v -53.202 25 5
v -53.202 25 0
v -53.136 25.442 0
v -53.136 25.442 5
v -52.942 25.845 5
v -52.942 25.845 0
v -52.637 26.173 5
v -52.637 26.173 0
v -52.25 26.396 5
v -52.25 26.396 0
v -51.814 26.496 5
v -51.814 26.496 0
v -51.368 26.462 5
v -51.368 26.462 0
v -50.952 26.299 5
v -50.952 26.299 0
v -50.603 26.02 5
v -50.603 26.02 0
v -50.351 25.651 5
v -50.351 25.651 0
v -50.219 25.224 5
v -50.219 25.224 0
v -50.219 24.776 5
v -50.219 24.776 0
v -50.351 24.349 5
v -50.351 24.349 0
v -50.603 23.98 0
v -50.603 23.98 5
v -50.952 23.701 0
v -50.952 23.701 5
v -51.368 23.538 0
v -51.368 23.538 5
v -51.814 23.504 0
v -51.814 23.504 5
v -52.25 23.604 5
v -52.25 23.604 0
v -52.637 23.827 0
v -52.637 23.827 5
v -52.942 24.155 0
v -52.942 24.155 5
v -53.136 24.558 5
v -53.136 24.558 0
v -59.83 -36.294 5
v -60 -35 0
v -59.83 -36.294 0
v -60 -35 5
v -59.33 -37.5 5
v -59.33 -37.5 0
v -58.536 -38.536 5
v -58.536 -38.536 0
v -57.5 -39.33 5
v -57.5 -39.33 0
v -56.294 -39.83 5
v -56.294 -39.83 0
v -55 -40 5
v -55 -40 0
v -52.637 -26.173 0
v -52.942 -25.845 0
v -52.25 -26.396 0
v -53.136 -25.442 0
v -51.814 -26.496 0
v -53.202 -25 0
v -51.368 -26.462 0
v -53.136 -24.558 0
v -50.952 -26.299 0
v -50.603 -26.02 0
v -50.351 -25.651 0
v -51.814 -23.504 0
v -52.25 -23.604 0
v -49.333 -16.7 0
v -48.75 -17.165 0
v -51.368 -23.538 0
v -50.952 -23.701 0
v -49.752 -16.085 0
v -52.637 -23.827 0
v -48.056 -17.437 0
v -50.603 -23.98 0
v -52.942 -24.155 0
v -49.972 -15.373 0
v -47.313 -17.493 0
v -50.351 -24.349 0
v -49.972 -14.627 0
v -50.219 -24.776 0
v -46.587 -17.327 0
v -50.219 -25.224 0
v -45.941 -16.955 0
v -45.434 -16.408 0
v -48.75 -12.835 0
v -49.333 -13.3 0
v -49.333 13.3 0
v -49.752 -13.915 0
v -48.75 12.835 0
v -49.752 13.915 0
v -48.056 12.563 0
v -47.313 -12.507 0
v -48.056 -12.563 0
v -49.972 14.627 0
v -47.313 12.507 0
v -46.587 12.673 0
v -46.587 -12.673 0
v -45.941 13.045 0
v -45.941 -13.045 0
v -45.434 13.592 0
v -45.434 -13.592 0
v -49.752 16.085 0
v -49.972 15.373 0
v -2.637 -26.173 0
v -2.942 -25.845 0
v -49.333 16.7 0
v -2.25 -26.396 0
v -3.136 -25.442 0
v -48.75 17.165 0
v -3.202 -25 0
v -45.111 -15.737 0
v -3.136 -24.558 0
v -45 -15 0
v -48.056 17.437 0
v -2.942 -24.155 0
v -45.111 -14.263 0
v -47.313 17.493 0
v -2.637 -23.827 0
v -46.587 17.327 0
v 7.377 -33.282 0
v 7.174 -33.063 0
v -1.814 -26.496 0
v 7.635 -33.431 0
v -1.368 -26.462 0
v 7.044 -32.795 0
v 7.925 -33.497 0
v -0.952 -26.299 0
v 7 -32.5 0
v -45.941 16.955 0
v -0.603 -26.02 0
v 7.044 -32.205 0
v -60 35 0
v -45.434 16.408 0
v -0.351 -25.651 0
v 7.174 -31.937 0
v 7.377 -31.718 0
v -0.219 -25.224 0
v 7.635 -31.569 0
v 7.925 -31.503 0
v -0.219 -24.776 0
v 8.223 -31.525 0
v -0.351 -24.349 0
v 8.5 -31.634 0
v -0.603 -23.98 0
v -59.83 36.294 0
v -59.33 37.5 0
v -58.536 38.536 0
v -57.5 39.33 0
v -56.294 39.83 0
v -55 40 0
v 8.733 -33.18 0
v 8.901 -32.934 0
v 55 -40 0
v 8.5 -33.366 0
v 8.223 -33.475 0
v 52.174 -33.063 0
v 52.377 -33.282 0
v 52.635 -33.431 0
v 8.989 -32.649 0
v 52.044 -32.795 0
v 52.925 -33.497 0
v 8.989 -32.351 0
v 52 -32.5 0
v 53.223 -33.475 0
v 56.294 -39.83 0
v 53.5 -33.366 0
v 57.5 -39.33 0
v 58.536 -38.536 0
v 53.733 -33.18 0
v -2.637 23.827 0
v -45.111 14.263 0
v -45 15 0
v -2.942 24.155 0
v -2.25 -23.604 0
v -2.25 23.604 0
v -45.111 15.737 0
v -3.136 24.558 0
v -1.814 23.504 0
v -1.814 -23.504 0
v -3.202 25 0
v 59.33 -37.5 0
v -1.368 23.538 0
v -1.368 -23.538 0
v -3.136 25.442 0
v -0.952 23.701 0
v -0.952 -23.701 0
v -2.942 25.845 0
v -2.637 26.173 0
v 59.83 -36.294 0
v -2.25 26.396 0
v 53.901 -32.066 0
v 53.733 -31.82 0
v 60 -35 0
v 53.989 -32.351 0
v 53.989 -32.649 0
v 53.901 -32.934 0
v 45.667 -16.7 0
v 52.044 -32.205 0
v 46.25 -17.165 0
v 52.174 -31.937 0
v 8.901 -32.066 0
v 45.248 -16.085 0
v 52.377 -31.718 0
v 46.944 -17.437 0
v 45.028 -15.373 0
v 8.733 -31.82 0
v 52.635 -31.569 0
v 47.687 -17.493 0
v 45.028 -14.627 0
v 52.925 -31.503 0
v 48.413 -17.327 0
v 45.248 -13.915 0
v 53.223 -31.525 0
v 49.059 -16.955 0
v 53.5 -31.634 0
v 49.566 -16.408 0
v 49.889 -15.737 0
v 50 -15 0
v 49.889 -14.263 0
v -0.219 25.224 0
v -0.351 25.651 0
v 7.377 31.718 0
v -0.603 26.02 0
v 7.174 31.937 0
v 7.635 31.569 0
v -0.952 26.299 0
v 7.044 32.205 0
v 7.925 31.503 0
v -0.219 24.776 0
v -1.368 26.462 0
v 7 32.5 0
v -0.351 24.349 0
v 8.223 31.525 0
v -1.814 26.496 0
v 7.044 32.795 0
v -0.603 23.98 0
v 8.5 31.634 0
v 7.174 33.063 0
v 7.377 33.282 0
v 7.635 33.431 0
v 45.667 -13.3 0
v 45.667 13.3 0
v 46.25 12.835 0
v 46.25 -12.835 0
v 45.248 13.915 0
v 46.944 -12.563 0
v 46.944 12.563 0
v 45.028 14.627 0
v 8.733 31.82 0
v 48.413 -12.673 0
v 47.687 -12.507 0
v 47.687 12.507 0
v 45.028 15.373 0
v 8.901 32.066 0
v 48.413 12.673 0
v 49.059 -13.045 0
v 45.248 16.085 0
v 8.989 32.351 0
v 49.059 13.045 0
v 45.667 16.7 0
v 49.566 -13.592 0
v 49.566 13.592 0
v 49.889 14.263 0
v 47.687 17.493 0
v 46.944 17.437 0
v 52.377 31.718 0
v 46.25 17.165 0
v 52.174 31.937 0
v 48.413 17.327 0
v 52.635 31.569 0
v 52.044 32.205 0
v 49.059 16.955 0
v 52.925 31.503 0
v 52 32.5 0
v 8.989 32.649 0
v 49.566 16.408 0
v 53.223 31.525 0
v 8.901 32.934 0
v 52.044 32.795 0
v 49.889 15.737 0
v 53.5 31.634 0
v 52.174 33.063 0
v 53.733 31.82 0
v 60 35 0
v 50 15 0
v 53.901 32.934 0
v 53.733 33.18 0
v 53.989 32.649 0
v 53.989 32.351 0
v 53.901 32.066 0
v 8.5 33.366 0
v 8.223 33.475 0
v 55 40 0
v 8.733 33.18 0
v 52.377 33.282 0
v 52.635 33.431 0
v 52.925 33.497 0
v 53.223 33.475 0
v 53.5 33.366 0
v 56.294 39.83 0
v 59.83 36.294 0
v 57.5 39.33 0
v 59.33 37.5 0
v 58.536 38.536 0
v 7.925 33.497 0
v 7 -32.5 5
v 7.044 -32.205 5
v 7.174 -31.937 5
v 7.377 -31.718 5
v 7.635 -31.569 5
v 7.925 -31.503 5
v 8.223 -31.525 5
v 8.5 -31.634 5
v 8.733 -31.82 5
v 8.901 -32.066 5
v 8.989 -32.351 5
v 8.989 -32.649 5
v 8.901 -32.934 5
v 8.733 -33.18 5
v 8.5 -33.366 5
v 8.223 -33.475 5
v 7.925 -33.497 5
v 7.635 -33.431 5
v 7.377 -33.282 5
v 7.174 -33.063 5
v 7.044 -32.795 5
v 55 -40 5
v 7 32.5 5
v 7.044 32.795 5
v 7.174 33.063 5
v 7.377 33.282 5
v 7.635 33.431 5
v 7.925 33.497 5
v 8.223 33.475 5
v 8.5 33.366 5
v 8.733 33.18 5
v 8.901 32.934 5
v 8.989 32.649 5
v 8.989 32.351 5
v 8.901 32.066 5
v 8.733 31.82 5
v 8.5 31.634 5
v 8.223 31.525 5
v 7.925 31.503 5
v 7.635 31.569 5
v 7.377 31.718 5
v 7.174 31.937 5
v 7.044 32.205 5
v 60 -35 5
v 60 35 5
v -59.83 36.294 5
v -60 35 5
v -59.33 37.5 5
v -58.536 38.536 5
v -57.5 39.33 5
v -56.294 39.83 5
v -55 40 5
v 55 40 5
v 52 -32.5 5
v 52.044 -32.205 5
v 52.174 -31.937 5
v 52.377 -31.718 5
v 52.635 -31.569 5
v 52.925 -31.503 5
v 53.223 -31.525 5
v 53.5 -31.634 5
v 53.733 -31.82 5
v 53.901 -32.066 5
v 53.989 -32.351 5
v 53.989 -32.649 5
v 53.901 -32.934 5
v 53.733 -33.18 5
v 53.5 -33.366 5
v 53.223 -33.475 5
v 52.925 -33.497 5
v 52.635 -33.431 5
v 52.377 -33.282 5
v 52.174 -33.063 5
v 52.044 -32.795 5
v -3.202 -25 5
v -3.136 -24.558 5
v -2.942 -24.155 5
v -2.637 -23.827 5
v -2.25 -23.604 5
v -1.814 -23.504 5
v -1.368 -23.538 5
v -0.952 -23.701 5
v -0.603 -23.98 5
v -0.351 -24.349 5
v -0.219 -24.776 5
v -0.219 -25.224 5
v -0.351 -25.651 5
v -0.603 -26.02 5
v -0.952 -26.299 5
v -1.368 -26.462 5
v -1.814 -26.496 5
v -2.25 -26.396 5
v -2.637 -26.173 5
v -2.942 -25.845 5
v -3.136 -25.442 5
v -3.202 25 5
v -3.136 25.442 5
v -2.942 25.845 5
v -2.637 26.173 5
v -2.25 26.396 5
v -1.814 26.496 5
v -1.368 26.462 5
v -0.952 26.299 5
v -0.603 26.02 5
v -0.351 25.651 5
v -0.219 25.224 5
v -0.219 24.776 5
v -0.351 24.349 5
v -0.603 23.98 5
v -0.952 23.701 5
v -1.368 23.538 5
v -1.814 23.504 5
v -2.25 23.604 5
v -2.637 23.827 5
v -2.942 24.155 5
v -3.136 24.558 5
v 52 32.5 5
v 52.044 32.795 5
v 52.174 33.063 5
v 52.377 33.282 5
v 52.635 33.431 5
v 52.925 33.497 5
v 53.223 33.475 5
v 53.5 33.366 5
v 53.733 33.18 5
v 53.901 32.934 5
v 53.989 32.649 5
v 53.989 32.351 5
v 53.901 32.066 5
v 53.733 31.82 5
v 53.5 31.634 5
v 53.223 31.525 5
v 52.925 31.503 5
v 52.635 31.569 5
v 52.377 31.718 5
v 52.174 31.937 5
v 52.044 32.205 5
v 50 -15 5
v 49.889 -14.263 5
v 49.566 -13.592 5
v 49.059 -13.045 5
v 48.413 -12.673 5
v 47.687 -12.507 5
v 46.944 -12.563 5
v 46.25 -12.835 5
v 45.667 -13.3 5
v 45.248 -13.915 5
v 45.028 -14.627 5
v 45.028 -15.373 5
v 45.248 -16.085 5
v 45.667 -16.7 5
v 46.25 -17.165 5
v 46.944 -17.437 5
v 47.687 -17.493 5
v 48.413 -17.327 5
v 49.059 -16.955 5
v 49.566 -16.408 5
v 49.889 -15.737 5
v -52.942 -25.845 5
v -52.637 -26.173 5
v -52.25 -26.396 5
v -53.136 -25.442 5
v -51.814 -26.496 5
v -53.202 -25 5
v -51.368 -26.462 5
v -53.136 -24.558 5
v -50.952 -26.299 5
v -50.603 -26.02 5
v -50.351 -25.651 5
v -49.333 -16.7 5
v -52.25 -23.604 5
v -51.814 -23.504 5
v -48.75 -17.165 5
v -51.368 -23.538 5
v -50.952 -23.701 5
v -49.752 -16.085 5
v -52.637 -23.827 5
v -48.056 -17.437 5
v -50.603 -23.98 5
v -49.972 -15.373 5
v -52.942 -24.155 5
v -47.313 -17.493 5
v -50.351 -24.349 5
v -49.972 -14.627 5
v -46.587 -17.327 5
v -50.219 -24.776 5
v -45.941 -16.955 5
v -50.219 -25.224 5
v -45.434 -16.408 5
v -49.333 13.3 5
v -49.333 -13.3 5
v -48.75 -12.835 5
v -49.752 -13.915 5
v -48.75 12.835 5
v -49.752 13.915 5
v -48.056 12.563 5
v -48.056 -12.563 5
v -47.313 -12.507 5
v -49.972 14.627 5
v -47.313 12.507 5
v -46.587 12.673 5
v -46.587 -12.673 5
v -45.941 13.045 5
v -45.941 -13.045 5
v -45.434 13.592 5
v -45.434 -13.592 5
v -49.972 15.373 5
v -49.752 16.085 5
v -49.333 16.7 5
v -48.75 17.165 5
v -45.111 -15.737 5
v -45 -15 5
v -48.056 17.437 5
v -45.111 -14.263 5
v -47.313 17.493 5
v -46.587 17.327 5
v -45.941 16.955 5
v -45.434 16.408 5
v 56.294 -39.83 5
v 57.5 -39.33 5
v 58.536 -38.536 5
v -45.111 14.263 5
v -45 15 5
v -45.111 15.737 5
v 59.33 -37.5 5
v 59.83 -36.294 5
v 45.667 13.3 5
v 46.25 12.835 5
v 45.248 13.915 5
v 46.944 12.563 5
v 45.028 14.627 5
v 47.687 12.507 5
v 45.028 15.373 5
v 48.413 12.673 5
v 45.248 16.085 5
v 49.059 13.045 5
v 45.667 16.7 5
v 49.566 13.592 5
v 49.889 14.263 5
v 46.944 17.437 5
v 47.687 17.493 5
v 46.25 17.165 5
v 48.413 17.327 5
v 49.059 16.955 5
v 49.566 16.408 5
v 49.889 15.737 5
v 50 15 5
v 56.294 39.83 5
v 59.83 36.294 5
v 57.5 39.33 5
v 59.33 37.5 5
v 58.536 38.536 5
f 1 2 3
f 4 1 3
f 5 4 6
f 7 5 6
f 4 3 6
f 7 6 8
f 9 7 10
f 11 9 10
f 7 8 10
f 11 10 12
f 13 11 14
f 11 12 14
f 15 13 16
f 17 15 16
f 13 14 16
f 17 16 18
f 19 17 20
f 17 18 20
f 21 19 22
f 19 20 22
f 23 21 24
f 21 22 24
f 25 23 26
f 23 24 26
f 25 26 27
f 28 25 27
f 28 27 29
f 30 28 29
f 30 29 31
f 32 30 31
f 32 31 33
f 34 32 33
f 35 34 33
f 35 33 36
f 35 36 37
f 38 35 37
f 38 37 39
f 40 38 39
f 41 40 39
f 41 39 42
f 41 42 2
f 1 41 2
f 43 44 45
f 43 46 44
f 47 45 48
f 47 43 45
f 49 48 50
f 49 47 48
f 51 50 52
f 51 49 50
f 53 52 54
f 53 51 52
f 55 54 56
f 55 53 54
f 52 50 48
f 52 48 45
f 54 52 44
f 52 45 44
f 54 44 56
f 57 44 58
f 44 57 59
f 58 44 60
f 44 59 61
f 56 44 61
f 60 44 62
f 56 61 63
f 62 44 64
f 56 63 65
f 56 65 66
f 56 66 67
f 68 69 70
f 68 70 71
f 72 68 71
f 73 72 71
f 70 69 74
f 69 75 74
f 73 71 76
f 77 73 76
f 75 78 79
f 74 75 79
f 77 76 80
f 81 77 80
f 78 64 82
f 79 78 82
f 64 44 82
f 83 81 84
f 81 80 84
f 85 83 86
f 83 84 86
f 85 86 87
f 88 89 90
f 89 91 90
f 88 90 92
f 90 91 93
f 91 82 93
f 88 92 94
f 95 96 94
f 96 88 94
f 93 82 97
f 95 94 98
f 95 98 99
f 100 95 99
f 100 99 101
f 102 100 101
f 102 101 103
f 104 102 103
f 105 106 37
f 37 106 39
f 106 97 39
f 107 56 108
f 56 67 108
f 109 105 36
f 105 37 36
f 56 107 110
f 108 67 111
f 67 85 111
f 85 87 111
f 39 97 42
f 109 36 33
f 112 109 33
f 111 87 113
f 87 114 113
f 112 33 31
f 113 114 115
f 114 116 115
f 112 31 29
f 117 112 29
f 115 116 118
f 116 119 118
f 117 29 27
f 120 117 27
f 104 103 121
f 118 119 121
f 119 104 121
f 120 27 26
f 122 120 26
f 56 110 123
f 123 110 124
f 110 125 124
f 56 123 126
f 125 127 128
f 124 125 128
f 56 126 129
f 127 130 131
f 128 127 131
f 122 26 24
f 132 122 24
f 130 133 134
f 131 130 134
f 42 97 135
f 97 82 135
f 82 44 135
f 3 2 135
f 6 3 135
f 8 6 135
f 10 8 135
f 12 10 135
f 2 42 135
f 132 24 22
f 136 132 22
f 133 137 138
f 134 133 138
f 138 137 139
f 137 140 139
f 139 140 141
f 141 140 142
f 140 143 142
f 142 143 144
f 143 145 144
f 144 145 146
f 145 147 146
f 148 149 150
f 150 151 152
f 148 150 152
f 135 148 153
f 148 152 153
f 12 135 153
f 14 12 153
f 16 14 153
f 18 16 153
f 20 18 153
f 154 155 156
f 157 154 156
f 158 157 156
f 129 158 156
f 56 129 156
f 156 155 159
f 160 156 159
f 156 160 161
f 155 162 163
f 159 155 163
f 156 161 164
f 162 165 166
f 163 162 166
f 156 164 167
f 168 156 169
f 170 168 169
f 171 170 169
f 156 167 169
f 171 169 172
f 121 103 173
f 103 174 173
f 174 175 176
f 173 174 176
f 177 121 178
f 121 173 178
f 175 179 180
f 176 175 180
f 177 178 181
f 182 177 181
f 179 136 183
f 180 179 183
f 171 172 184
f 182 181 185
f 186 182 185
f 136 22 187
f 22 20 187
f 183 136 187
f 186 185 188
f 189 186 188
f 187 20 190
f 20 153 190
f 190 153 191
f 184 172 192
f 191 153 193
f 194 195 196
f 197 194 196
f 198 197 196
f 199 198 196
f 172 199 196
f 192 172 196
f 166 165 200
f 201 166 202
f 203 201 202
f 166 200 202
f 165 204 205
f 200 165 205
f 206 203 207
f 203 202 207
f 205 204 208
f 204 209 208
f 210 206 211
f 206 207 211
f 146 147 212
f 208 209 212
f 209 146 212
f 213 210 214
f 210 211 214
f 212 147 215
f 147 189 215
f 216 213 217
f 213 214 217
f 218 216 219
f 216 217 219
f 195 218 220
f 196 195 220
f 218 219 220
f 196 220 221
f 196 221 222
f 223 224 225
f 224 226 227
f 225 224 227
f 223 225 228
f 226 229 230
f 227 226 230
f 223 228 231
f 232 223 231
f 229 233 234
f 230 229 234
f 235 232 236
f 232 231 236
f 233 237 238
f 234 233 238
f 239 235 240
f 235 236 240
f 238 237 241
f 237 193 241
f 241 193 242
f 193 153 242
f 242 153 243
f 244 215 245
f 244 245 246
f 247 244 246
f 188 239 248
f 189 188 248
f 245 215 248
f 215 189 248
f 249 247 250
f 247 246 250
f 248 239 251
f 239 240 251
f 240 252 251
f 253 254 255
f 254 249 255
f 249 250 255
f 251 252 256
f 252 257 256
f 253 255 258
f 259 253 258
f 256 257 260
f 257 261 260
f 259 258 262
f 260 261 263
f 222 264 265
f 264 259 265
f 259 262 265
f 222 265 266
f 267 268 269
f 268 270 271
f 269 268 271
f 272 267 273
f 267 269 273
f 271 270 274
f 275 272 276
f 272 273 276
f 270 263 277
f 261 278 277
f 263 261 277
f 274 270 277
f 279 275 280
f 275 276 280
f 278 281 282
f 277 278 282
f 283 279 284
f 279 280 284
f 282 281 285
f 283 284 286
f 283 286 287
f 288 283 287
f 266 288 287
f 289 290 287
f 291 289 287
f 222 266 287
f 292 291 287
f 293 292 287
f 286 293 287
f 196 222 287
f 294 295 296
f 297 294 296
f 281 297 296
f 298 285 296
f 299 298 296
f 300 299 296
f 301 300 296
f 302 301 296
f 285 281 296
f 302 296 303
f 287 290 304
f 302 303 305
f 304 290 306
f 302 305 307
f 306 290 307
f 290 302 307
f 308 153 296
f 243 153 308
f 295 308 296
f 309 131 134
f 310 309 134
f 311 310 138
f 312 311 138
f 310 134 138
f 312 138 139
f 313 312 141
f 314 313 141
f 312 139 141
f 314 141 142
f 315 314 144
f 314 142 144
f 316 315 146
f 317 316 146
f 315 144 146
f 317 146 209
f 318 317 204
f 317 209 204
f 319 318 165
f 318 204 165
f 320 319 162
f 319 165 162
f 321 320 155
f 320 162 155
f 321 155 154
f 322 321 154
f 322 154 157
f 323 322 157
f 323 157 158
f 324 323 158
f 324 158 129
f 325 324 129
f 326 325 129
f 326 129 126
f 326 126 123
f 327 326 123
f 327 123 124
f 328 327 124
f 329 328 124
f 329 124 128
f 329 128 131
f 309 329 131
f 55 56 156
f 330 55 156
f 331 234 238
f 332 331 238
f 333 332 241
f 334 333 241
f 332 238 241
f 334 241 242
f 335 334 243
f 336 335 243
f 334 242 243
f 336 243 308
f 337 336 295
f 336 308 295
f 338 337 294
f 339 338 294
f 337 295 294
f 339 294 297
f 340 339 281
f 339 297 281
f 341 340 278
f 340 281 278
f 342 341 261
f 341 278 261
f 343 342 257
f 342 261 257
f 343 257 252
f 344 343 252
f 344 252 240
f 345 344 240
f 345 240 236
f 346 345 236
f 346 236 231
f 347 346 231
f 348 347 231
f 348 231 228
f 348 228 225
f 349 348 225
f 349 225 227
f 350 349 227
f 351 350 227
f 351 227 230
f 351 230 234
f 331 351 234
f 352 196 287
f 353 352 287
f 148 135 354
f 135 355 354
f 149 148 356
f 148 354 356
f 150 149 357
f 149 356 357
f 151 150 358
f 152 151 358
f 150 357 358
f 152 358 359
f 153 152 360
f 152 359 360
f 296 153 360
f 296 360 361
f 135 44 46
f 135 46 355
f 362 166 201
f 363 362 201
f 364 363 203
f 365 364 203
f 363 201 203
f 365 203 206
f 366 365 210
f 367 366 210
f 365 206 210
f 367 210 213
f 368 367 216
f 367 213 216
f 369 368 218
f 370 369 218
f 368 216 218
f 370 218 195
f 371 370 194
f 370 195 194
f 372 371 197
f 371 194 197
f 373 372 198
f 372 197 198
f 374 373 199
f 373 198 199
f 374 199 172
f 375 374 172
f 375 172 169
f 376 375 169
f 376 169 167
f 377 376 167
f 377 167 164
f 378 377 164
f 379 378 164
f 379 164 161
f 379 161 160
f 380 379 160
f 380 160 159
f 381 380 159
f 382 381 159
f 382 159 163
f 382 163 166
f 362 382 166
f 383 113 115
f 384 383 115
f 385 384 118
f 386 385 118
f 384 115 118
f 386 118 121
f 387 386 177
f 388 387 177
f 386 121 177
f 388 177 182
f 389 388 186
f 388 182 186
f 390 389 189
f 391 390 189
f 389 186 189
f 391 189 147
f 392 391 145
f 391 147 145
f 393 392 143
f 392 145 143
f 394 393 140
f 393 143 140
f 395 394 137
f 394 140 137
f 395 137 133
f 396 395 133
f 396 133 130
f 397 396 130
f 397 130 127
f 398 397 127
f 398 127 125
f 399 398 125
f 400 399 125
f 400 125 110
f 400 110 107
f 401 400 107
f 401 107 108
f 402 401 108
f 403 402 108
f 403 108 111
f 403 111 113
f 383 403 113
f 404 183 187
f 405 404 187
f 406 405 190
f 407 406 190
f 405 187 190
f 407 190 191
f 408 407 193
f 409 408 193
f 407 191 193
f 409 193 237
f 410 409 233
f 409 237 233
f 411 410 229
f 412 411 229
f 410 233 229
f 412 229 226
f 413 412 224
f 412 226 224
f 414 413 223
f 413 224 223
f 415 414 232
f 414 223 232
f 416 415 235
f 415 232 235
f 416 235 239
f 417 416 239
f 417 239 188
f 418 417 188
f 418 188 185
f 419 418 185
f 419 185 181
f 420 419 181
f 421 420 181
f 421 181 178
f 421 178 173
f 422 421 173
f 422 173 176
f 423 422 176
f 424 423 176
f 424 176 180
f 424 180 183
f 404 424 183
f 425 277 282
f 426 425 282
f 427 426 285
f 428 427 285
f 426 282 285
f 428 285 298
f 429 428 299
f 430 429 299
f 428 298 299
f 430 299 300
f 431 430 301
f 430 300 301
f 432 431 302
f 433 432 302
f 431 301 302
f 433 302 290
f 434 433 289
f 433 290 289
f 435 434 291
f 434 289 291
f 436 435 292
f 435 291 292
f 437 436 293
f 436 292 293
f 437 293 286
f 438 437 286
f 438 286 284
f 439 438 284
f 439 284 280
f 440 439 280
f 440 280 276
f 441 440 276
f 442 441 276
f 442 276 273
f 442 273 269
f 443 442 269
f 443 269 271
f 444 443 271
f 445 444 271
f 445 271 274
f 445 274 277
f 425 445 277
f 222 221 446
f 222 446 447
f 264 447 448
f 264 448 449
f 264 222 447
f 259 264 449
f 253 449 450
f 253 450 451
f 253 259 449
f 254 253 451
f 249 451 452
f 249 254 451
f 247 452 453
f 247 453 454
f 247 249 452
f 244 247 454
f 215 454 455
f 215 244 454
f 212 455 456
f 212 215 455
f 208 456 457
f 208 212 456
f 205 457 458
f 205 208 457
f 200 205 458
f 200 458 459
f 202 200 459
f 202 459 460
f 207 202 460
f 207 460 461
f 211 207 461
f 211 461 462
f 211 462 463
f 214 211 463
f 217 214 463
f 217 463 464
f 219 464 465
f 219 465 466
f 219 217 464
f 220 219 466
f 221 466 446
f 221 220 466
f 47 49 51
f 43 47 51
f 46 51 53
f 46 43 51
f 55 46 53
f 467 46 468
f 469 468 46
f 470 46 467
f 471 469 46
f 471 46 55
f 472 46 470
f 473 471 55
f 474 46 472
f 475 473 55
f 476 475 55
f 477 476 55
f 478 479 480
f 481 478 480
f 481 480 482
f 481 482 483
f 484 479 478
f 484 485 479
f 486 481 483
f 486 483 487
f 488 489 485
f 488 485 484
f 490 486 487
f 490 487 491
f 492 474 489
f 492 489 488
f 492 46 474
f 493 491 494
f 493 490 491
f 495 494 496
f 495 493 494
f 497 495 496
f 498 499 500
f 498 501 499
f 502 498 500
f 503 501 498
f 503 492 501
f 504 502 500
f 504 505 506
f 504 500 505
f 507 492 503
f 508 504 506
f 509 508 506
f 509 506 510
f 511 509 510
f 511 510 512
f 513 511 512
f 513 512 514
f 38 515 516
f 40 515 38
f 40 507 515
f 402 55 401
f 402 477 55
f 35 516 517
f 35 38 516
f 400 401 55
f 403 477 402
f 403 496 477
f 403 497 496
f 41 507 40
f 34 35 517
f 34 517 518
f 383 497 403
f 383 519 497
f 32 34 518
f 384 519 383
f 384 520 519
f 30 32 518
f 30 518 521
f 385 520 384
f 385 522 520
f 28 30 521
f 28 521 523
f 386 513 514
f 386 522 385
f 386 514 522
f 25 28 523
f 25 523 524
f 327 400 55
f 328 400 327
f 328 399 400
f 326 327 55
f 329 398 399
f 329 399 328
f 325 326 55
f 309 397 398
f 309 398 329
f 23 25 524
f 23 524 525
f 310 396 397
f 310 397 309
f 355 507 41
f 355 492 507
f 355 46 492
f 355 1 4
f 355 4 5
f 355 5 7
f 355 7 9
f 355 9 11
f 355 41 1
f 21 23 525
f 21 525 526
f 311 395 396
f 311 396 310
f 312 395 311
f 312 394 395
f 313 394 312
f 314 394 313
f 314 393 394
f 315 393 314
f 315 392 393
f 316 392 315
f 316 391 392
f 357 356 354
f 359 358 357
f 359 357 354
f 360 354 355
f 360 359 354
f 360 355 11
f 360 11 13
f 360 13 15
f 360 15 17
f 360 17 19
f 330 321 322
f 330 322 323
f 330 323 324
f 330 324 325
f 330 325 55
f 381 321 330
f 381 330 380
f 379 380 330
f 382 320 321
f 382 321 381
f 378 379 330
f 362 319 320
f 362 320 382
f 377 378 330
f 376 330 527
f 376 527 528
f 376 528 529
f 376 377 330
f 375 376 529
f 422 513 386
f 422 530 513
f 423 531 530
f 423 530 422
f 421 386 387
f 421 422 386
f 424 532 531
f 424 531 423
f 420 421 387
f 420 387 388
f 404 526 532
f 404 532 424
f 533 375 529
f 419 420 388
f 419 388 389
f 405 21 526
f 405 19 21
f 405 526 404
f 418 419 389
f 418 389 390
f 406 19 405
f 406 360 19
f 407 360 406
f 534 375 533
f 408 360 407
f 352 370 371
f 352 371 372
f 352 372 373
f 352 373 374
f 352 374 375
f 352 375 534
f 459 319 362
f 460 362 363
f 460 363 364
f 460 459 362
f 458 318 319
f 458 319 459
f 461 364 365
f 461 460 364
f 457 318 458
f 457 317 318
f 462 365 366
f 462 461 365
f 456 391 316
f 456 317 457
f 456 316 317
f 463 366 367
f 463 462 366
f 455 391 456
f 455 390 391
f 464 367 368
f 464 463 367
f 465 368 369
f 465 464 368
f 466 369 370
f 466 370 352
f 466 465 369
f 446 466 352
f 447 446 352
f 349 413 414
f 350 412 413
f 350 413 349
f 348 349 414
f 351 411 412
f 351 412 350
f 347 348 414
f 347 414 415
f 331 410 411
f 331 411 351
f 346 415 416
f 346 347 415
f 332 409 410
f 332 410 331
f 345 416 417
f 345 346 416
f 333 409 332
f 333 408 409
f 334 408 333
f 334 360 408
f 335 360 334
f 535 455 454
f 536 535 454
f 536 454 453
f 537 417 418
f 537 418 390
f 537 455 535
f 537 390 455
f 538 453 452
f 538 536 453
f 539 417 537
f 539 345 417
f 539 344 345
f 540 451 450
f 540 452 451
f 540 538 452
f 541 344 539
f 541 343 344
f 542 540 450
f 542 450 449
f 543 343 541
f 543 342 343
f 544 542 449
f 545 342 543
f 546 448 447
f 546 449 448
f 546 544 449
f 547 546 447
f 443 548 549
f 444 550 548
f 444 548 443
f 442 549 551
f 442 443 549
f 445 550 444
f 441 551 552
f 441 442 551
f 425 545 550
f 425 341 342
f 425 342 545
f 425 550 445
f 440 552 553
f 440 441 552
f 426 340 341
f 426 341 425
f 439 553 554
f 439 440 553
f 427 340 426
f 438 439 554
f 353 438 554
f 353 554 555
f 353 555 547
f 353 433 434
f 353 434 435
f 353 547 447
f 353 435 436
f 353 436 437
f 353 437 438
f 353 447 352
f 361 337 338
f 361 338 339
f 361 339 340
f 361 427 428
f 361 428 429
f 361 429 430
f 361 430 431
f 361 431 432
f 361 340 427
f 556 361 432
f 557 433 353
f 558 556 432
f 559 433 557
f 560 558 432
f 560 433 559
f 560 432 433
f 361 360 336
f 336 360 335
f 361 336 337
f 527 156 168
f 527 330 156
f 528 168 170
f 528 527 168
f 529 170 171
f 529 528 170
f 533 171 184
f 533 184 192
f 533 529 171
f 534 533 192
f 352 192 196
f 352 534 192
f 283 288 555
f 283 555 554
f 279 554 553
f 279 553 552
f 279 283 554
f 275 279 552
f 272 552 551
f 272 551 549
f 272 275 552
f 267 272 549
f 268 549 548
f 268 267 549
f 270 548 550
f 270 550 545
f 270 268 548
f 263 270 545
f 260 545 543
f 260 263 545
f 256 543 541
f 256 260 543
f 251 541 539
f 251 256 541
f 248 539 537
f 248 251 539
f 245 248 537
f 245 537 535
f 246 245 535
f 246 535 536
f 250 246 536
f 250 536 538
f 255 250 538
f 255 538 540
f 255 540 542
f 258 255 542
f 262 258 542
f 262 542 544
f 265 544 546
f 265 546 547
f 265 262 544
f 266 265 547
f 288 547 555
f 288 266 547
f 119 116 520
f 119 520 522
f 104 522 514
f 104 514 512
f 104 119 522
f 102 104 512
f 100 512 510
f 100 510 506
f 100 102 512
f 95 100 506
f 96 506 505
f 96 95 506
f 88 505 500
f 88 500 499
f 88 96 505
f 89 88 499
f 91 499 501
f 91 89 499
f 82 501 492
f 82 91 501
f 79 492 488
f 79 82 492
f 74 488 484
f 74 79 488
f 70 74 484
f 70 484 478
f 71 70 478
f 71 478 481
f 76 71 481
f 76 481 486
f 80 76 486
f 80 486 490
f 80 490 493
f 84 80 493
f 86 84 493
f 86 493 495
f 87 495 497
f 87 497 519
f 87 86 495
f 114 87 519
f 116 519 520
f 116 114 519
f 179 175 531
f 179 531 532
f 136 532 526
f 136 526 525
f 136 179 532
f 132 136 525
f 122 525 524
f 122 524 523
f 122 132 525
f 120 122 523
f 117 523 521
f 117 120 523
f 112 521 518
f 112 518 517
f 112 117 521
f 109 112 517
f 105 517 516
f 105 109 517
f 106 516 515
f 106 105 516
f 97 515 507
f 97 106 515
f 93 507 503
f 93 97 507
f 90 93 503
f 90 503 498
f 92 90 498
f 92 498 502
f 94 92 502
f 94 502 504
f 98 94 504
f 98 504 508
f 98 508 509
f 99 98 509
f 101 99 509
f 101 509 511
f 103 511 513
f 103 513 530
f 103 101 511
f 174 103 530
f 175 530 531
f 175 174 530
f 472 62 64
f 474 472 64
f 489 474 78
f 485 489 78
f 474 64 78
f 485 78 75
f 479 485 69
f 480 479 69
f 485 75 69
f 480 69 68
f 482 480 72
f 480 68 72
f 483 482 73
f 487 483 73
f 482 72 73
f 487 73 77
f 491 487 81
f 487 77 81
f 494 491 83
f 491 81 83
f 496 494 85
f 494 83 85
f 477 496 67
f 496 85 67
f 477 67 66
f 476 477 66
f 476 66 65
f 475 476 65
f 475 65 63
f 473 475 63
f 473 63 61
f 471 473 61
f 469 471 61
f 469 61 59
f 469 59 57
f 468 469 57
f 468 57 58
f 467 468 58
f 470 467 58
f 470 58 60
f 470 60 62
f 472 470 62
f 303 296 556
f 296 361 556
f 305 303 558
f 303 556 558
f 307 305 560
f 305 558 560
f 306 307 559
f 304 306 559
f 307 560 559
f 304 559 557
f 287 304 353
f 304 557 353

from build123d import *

# Parameters (mm, degrees)
SKETCH_1_W          = 120
SKETCH_1_H          = 80
SKETCH_1_R          = 2.5
EXTRUDE_1_DEPTH     = 5
SKETCH_3_R          = 1.5
SKETCH_3_R_2        = 1
CUT_EXTRUDE_1_DEPTH = 10
FILLET_1_R          = 5


with BuildPart() as part:
    # 草图1 → 凸台-拉伸1 (new body)
    with BuildSketch(Plane.XY):
        Rectangle(SKETCH_1_W, SKETCH_1_H)
        with Locations((-47.5, 15)):
            Circle(SKETCH_1_R, mode=Mode.SUBTRACT)
        with Locations((47.5, 15)):
            Circle(SKETCH_1_R, mode=Mode.SUBTRACT)
        with Locations((47.5, -15)):
            Circle(SKETCH_1_R, mode=Mode.SUBTRACT)
        with Locations((-47.5, -15)):
            Circle(SKETCH_1_R, mode=Mode.SUBTRACT)
    extrude(amount=EXTRUDE_1_DEPTH)

    # 草图3 → 切除-拉伸1 (cut)
    with BuildSketch(Plane(origin=(0, 0, 0), x_dir=(-1, 0, 0), z_dir=(0, 0, -1))):
        with Locations((51.702251253, -25)):
            Circle(SKETCH_3_R)
        with Locations((1.702251253, -25)):
            Circle(SKETCH_3_R)
        with Locations((1.702251253, 25)):
            Circle(SKETCH_3_R)
        with Locations((51.702251253, 25)):
            Circle(SKETCH_3_R)
        with Locations((-8, -32.5)):
            Circle(SKETCH_3_R_2)
        with Locations((-53, -32.5)):
            Circle(SKETCH_3_R_2)
        with Locations((-53, 32.5)):
            Circle(SKETCH_3_R_2)
        with Locations((-8, 32.5)):
            Circle(SKETCH_3_R_2)
    extrude(amount=-CUT_EXTRUDE_1_DEPTH, mode=Mode.SUBTRACT)

    # 圆角1
    fillet_1_edges = [part.edges().sort_by_distance(p)[0] for p in [
        (60, -40, 2.5),
        (-60, -40, 2.5),
        (-60, 40, 2.5),
        (60, 40, 2.5),
    ]]
    fillet(fillet_1_edges, radius=FILLET_1_R)


solid = part.part
